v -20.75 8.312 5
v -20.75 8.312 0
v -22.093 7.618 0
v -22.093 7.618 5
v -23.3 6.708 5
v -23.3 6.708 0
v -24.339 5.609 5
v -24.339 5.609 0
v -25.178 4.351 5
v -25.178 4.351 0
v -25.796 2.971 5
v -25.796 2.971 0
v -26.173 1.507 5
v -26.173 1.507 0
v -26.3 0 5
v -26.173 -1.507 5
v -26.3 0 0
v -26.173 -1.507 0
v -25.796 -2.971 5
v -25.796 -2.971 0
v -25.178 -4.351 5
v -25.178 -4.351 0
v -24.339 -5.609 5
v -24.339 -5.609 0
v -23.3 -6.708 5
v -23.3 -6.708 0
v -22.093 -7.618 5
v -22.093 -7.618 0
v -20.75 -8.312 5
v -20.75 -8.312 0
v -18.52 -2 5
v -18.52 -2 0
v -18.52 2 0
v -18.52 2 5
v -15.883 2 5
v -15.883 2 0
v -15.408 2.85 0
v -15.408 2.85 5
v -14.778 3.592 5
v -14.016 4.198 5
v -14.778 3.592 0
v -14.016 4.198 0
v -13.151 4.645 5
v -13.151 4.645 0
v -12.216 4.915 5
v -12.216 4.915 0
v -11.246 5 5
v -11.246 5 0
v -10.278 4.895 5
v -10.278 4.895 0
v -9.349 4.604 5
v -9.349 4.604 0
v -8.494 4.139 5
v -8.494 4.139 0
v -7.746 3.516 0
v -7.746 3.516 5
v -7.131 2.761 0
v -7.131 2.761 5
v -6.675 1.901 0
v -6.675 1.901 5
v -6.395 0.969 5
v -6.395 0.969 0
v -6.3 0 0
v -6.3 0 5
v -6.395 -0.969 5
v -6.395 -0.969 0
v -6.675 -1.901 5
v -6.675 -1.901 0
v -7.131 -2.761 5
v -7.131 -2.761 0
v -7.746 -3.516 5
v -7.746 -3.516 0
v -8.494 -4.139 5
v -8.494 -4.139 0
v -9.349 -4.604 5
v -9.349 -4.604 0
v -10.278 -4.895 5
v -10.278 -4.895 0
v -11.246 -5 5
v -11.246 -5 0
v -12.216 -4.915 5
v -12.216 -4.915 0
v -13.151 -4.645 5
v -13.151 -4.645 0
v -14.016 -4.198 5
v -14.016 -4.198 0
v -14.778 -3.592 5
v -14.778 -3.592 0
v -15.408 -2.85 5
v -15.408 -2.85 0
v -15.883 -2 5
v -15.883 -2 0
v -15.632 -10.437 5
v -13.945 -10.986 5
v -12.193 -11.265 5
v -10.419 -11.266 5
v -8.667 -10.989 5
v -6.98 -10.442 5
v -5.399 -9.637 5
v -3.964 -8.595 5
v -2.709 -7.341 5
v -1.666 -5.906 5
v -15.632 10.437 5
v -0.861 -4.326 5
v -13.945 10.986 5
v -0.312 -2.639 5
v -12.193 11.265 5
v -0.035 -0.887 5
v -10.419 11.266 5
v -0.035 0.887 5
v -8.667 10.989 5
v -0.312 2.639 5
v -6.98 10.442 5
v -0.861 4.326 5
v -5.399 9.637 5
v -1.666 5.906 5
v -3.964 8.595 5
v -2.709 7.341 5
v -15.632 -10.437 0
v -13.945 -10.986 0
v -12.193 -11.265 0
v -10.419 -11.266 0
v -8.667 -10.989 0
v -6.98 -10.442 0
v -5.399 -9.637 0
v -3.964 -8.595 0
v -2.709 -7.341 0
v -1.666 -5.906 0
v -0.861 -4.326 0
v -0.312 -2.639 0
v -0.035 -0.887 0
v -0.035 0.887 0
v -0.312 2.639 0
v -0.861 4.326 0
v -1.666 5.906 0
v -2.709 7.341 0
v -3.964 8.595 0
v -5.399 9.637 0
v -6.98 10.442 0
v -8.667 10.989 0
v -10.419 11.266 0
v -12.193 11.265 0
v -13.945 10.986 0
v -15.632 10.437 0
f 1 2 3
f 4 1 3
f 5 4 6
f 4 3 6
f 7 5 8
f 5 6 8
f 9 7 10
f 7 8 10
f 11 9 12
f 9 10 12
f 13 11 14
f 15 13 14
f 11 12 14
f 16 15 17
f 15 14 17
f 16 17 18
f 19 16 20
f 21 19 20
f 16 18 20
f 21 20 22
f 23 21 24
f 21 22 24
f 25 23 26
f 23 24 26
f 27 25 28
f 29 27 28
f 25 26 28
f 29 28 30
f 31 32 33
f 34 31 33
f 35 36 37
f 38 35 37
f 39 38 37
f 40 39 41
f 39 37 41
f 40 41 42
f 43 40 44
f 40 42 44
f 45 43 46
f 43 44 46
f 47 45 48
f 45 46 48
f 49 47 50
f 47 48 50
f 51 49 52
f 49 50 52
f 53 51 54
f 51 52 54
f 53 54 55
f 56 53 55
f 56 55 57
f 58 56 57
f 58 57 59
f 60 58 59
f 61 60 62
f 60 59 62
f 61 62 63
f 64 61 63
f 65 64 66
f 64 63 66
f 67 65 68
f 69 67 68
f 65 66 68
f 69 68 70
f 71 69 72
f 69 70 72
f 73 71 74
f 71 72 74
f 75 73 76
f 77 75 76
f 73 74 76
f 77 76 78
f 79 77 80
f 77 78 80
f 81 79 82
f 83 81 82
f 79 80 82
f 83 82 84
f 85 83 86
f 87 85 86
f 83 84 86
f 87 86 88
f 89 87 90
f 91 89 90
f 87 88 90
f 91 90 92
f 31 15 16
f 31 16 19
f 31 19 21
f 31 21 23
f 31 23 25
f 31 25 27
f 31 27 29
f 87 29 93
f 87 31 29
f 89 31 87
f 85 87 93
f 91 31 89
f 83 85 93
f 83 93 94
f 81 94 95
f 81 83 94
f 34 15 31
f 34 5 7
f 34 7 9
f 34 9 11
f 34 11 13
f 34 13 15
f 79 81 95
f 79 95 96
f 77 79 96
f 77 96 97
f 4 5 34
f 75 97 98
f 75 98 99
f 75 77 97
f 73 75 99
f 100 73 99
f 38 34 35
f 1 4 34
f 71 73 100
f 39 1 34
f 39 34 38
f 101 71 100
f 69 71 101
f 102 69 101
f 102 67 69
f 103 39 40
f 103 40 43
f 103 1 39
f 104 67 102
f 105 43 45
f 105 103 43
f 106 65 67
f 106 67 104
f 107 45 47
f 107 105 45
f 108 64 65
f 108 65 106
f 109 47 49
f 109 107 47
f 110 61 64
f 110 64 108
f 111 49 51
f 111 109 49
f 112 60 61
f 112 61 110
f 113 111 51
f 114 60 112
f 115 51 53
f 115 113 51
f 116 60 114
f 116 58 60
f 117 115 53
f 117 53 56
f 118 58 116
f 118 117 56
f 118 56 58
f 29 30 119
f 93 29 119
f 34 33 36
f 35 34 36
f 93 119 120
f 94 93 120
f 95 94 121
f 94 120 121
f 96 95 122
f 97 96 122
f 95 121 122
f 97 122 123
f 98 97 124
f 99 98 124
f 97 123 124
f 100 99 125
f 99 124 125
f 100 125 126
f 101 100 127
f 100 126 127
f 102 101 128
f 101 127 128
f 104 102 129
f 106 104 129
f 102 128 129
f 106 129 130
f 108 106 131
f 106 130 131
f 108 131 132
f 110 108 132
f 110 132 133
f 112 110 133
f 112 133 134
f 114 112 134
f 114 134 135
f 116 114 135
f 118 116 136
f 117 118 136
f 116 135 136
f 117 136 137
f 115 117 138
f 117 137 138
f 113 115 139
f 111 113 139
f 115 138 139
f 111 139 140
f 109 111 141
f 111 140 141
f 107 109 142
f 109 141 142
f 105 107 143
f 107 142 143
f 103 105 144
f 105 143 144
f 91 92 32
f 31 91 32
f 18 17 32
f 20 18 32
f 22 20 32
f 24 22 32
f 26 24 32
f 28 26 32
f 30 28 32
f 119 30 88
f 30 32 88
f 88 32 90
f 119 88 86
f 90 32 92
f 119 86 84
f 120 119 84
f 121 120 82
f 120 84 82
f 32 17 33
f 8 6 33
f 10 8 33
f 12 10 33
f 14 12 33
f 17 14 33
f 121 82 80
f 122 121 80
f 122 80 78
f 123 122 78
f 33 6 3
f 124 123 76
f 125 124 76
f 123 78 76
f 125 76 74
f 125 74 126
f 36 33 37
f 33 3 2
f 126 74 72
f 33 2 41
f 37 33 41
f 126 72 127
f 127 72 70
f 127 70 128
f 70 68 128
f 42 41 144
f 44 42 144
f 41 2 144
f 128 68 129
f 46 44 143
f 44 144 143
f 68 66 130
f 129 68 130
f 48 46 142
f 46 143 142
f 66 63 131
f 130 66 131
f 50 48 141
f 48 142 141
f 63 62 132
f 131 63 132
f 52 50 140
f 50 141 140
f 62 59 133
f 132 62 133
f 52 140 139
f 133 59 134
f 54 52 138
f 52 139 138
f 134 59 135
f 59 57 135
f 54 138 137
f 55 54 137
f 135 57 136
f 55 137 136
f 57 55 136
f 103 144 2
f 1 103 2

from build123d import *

# Parameters (mm, degrees)
BOSS_EXTRUDE2_DEPTH = 5


with BuildPart() as part:
    # Sketch3 → Boss-Extrude2 (new body)
    with BuildSketch(Plane.XY):
        with BuildLine():
            ThreePointArc((-20.75, 8.312490601), (-26.3, 0), (-20.75, -8.312490601))
            Line((-20.75, -8.312490601), (-15.631666667, -10.436793755))
            ThreePointArc((-15.631666667, -10.436793755), (0, 0), (-15.631666667, 10.436793755))
            Line((-15.631666667, 10.436793755), (-20.75, 8.312490601))
        make_face()
        with BuildLine():
            Line((-15.882575695, -2), (-18.52, -2))
            Line((-18.52, -2), (-18.52, 2))
            Line((-18.52, 2), (-15.882575695, 2))
            ThreePointArc((-15.882575695, 2), (-6.3, 0), (-15.882575695, -2))
        make_face(mode=Mode.SUBTRACT)
    extrude(amount=BOSS_EXTRUDE2_DEPTH)


solid = part.part
